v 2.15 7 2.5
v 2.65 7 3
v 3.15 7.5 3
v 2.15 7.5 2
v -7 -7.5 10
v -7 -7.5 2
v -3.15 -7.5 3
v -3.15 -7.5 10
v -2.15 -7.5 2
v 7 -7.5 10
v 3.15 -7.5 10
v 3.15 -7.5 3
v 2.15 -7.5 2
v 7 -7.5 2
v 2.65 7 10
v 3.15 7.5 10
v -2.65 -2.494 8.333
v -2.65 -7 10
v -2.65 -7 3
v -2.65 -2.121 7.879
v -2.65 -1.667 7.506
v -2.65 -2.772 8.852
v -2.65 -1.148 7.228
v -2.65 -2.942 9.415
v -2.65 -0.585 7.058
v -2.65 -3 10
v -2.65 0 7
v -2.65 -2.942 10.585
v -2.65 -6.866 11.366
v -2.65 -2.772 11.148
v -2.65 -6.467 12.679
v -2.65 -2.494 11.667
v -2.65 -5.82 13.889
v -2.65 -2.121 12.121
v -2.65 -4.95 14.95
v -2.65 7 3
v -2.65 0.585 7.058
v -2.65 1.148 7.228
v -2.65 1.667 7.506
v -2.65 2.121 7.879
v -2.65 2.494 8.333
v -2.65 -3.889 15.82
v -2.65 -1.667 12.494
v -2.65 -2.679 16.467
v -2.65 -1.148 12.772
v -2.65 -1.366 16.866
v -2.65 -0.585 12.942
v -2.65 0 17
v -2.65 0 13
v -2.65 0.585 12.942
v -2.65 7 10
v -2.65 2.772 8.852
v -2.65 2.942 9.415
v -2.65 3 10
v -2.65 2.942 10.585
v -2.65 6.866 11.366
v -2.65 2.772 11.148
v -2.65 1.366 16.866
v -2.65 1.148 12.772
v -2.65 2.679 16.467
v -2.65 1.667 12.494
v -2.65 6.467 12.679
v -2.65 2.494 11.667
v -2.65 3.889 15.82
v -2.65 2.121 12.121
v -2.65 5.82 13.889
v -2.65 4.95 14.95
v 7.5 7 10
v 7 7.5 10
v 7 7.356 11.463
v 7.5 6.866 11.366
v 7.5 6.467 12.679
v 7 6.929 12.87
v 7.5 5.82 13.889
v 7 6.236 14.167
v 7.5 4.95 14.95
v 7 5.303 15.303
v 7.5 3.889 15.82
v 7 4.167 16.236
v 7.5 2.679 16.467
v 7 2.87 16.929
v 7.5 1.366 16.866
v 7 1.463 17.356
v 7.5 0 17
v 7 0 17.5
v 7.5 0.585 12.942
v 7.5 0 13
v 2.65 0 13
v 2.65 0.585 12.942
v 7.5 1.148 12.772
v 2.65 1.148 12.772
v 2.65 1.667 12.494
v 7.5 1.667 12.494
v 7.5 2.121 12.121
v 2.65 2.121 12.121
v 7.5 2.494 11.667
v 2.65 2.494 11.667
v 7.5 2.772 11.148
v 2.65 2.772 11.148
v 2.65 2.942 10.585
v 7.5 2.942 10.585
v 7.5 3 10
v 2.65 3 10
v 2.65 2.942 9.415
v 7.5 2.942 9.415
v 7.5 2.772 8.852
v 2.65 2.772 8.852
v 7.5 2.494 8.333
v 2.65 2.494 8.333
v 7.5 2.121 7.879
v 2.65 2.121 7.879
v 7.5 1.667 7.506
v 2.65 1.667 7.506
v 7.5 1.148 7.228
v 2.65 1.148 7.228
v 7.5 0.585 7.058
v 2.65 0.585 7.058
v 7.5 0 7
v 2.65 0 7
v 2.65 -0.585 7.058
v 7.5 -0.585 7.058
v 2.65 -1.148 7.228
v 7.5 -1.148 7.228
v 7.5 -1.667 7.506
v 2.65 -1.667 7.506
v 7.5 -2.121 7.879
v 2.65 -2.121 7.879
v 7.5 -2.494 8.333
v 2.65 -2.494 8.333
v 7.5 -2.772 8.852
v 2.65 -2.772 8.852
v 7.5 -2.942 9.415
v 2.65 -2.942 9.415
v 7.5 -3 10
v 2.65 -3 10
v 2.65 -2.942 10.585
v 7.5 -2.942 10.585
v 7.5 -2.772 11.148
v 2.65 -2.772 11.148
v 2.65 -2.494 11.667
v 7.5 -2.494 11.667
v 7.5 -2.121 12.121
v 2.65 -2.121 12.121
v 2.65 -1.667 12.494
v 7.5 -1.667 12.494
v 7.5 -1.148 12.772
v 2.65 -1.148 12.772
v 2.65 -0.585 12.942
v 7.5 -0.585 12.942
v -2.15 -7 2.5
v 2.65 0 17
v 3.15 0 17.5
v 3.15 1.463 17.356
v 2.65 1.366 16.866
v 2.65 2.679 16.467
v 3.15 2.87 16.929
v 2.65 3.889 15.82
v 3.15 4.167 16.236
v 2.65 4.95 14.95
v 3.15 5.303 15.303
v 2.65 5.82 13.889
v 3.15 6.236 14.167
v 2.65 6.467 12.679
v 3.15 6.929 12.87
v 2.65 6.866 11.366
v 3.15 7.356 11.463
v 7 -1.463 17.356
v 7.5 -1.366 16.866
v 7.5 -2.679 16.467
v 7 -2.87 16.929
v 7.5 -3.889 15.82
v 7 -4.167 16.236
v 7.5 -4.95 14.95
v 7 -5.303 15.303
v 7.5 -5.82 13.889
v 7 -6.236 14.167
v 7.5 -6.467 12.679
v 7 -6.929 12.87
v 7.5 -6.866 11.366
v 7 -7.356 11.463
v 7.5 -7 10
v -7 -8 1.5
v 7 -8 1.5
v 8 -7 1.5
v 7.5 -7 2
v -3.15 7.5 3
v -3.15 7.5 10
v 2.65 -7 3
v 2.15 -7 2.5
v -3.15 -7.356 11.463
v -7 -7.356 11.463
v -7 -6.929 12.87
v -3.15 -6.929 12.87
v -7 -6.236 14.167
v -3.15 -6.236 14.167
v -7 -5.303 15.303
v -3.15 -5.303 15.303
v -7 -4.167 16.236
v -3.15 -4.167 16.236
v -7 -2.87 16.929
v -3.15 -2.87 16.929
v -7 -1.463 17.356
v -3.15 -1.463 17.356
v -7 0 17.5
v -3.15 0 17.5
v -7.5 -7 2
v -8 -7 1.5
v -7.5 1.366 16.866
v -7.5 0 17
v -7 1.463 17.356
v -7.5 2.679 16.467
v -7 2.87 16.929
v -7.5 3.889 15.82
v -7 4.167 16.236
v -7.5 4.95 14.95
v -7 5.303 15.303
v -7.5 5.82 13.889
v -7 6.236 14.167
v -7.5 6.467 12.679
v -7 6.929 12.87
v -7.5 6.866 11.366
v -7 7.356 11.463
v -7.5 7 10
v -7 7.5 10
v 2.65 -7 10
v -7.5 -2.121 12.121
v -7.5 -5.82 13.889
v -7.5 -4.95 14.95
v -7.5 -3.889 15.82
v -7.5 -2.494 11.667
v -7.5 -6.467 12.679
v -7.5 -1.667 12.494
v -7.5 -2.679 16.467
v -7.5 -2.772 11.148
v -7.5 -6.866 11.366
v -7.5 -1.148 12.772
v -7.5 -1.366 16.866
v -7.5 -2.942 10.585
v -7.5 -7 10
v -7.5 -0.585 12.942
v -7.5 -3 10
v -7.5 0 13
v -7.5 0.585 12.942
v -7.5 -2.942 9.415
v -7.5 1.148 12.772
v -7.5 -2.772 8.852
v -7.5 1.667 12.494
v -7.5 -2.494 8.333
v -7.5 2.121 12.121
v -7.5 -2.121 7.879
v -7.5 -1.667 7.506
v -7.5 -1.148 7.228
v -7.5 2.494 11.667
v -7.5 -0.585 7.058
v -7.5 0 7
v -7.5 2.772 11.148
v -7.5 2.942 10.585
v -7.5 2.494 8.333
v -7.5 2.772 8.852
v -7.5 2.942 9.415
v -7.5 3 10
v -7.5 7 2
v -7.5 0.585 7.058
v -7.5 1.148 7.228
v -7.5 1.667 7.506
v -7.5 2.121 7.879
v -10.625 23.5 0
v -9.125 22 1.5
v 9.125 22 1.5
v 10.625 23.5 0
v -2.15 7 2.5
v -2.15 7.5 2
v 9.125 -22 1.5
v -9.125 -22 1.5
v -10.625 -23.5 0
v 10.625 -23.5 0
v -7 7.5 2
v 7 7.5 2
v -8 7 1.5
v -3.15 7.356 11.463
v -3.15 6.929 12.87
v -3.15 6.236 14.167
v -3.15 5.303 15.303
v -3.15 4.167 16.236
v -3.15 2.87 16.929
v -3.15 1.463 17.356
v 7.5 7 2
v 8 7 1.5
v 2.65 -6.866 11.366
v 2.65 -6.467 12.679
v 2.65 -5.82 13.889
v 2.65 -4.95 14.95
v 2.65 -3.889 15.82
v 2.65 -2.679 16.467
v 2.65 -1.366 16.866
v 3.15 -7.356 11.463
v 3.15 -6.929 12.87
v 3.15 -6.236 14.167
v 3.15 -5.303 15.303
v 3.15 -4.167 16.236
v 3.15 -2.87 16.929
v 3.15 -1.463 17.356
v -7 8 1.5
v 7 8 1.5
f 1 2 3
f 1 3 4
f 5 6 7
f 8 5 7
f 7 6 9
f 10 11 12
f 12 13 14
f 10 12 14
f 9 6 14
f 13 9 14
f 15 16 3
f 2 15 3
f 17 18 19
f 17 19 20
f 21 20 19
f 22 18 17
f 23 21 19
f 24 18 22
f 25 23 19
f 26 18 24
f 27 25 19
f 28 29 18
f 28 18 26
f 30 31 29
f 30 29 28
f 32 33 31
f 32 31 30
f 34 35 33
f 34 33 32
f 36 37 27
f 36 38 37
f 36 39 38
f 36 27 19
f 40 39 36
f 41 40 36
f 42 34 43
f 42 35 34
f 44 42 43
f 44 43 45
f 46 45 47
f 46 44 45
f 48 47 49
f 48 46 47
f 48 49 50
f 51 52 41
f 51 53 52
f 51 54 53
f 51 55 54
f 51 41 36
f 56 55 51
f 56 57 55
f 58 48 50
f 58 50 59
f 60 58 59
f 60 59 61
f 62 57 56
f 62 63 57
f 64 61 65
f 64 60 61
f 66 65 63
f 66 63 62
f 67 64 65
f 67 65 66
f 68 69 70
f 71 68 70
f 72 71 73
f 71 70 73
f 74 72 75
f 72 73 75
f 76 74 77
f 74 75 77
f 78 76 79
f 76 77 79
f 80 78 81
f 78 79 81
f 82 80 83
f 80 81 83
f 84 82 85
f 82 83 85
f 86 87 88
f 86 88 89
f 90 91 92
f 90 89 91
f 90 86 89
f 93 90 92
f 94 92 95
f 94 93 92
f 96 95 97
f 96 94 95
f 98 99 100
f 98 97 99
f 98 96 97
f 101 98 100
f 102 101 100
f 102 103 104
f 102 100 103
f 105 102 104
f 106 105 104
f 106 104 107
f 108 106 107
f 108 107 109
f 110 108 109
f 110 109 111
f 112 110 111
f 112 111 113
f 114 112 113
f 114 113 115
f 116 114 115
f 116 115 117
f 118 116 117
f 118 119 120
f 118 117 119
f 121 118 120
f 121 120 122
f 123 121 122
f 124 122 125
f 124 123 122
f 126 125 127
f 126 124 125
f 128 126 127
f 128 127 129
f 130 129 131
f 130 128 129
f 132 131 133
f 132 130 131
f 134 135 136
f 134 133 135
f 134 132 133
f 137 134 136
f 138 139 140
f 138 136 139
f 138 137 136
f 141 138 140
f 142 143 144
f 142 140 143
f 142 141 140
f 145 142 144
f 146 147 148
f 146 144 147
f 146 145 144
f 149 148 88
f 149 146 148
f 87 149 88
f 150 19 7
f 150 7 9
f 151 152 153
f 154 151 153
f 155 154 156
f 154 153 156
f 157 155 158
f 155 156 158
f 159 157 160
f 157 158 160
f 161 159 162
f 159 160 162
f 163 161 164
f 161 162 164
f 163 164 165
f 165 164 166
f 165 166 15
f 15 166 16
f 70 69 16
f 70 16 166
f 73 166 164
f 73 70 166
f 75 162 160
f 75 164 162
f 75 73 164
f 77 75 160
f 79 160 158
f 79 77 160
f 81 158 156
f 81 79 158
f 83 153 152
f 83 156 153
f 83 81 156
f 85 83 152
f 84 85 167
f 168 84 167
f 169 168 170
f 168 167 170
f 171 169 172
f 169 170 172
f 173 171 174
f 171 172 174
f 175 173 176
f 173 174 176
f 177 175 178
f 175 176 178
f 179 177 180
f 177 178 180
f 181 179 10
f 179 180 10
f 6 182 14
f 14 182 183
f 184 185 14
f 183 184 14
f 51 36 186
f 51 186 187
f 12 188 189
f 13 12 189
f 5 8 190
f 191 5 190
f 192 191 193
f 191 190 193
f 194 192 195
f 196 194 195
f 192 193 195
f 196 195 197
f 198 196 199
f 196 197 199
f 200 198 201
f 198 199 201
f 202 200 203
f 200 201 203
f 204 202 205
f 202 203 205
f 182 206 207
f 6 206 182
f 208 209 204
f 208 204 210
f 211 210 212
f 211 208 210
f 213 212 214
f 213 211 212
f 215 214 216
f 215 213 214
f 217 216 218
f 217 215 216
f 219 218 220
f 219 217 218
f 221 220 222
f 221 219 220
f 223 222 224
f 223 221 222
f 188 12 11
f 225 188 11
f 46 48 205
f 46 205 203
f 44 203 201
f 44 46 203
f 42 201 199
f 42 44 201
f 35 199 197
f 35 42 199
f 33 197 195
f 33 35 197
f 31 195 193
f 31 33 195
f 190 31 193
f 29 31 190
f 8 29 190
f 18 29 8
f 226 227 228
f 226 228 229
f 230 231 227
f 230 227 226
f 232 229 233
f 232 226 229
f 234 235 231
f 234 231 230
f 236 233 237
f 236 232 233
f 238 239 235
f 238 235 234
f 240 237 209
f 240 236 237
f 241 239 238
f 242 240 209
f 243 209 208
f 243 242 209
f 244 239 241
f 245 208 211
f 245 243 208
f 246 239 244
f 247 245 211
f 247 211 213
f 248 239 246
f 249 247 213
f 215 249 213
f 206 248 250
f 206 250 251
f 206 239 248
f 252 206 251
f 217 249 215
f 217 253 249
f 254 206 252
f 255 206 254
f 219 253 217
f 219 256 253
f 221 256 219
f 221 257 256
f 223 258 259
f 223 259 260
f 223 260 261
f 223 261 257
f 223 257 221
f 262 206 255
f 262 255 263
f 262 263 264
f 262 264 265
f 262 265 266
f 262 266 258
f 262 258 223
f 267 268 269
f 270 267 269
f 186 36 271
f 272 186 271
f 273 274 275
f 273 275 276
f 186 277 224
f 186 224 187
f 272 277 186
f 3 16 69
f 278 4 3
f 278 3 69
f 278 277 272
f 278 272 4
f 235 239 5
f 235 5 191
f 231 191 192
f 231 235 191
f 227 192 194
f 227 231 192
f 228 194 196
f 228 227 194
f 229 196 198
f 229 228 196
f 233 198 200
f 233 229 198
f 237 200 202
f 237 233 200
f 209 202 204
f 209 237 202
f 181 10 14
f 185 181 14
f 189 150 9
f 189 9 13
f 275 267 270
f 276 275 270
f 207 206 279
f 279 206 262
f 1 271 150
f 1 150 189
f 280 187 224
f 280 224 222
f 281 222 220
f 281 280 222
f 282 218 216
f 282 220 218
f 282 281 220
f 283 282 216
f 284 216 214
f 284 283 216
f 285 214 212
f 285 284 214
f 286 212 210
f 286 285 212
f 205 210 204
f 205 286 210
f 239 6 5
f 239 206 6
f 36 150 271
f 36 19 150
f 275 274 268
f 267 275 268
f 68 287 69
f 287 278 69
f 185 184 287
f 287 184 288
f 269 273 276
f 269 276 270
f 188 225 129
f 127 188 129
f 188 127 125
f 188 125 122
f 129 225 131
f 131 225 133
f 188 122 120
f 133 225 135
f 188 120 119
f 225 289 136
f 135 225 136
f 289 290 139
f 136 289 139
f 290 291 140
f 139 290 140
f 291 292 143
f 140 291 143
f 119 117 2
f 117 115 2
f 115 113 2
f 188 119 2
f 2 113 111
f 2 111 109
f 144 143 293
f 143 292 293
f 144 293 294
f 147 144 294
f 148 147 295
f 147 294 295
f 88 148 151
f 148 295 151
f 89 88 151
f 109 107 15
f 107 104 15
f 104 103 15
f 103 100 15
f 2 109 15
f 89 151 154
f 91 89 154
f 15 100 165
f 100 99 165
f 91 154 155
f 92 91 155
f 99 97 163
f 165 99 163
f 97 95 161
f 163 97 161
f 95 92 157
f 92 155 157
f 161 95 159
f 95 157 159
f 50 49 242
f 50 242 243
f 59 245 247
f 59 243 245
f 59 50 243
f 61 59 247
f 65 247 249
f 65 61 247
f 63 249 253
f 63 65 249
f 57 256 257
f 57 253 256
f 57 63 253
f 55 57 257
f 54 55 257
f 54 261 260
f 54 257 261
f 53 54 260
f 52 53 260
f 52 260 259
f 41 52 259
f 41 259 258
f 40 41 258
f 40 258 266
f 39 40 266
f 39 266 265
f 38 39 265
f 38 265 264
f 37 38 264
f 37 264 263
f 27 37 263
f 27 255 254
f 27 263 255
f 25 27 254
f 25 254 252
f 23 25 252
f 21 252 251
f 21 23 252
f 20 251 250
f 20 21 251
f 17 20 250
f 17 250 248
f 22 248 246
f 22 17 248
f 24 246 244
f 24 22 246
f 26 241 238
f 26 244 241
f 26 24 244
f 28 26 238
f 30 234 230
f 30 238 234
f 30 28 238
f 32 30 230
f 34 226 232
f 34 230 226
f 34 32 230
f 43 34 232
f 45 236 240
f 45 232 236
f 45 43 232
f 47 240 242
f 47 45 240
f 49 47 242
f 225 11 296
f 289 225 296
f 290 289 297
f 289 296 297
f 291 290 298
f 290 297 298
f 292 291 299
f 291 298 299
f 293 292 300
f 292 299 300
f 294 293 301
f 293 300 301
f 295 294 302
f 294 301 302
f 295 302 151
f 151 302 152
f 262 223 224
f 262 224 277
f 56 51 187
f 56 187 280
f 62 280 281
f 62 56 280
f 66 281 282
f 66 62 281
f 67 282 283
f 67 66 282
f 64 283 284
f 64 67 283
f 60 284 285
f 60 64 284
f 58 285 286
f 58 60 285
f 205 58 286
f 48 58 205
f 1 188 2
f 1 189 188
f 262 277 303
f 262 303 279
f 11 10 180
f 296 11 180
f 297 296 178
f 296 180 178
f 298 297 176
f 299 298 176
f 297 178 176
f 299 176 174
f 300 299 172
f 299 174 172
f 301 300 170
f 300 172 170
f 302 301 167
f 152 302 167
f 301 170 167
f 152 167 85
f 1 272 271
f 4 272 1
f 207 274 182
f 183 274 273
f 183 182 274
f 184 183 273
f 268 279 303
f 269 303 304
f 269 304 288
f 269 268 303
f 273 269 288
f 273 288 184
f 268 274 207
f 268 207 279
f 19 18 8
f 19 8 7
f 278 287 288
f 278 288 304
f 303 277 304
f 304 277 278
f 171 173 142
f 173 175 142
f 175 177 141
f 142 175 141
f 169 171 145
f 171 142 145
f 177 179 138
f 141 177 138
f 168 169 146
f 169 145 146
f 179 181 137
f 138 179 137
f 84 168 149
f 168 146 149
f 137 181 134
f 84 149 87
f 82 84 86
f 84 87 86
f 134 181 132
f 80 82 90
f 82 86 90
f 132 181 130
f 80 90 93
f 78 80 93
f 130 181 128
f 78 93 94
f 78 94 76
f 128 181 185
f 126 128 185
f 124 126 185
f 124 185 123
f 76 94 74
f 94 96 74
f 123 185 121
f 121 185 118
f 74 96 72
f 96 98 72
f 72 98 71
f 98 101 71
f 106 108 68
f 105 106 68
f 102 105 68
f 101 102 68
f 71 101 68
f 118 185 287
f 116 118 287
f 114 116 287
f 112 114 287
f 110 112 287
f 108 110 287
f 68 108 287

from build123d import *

# Parameters (mm, degrees)
SKETCH1_W               = 21.25
SKETCH1_H               = 47
BOSS_EXTRUDE1_DEPTH     = 1.5
CHAMFER1_SIZE           = 1.5
SKETCH2_W               = 15
SKETCH2_H               = 15
BOSS_EXTRUDE2_DEPTH     = 16
SKETCH3_W               = 5.3
SKETCH3_H               = 15
CUT_EXTRUDE1_DEPTH      = 15
CUT_EXTRUDE2_DEPTH      = 35.453093112
CUT_EXTRUDE2_DEPTH_BACK = 35.453093112
SKETCH4_R               = 3
FILLET1_R               = 7.5
CHAMFER2_SIZE           = 0.5


with BuildPart() as part:
    # Sketch1 → Boss-Extrude1 (new body)
    with BuildSketch(Plane.XY):
        Rectangle(SKETCH1_W, SKETCH1_H)
    extrude(amount=BOSS_EXTRUDE1_DEPTH)

    # Chamfer1
    chamfer1_edges = [part.edges().sort_by_distance(p)[0] for p in [
        (0, -23.5, 1.5),
        (-10.625, 0, 1.5),
        (0, 23.5, 1.5),
        (10.625, 0, 1.5),
    ]]
    chamfer(chamfer1_edges, length=CHAMFER1_SIZE - 0.0001)  # a hair under: the kernel refuses the full size

    # Sketch2 → Boss-Extrude2 (add)
    with BuildSketch(Plane.XY.offset(1.5)):
        Rectangle(SKETCH2_W, SKETCH2_H)
    extrude(amount=BOSS_EXTRUDE2_DEPTH)

    # Sketch3 → Cut-Extrude1 (cut)
    with BuildSketch(Plane.XY.offset(17.5)):
        Rectangle(SKETCH3_W, SKETCH3_H)
    extrude(amount=-CUT_EXTRUDE1_DEPTH, mode=Mode.SUBTRACT)

    # Sketch4 → Cut-Extrude2 (cut, two sides: drawn at the far end of the back side and taken through both)
    with BuildSketch(Plane.ZY.offset(7.5).offset(-CUT_EXTRUDE2_DEPTH_BACK)):
        with Locations((10, 0)):
            Circle(SKETCH4_R)
    extrude(amount=CUT_EXTRUDE2_DEPTH + CUT_EXTRUDE2_DEPTH_BACK, mode=Mode.SUBTRACT)

    # Fillet1
    fillet1_edges = [part.edges().sort_by_distance(p)[0] for p in [
        (5.075, -7.5, 17.5),
        (5.075, 7.5, 17.5),
        (-5.075, 7.5, 17.5),
        (-5.075, -7.5, 17.5),
    ]]
    fillet(fillet1_edges, radius=FILLET1_R - 0.0001)  # a hair under: the kernel refuses the full size

    # Chamfer2
    chamfer2_edges = [part.edges().sort_by_distance(p)[0] for p in [
        (7.5, 0, 1.5),
        (0, 7.5, 1.5),
        (-7.5, 0, 1.5),
        (0, -7.5, 1.5),
        (2.65, 0, 2.5),
        (2.65, 7.5, 6.25005),
        (0, -7.5, 2.5),
        (2.65, -7.5, 6.25005),
        (-2.65, 0, 2.5),
        (-2.65, -7.5, 6.25005),
        (0, 7.5, 2.5),
        (-2.65, 7.5, 6.25005),
        (7.5, 7.5, 5.75005),
        (7.5, -7.5, 5.75005),
        (7.5, 5.303330148, 15.303330148),
        (7.5, -5.303330148, 15.303330148),
        (-7.5, -7.5, 5.75005),
        (2.65, 5.303330148, 15.303330148),
        (2.65, -5.303330148, 15.303330148),
        (-7.5, 7.5, 5.75005),
        (-7.5, -5.303330148, 15.303330148),
        (-7.5, 5.303330148, 15.303330148),
        (-2.65, -5.303330148, 15.303330148),
        (-2.65, 5.303330148, 15.303330148),
    ]]
    chamfer(chamfer2_edges, length=CHAMFER2_SIZE - 0.0001)  # a hair under: the kernel refuses the full size


solid = part.part
